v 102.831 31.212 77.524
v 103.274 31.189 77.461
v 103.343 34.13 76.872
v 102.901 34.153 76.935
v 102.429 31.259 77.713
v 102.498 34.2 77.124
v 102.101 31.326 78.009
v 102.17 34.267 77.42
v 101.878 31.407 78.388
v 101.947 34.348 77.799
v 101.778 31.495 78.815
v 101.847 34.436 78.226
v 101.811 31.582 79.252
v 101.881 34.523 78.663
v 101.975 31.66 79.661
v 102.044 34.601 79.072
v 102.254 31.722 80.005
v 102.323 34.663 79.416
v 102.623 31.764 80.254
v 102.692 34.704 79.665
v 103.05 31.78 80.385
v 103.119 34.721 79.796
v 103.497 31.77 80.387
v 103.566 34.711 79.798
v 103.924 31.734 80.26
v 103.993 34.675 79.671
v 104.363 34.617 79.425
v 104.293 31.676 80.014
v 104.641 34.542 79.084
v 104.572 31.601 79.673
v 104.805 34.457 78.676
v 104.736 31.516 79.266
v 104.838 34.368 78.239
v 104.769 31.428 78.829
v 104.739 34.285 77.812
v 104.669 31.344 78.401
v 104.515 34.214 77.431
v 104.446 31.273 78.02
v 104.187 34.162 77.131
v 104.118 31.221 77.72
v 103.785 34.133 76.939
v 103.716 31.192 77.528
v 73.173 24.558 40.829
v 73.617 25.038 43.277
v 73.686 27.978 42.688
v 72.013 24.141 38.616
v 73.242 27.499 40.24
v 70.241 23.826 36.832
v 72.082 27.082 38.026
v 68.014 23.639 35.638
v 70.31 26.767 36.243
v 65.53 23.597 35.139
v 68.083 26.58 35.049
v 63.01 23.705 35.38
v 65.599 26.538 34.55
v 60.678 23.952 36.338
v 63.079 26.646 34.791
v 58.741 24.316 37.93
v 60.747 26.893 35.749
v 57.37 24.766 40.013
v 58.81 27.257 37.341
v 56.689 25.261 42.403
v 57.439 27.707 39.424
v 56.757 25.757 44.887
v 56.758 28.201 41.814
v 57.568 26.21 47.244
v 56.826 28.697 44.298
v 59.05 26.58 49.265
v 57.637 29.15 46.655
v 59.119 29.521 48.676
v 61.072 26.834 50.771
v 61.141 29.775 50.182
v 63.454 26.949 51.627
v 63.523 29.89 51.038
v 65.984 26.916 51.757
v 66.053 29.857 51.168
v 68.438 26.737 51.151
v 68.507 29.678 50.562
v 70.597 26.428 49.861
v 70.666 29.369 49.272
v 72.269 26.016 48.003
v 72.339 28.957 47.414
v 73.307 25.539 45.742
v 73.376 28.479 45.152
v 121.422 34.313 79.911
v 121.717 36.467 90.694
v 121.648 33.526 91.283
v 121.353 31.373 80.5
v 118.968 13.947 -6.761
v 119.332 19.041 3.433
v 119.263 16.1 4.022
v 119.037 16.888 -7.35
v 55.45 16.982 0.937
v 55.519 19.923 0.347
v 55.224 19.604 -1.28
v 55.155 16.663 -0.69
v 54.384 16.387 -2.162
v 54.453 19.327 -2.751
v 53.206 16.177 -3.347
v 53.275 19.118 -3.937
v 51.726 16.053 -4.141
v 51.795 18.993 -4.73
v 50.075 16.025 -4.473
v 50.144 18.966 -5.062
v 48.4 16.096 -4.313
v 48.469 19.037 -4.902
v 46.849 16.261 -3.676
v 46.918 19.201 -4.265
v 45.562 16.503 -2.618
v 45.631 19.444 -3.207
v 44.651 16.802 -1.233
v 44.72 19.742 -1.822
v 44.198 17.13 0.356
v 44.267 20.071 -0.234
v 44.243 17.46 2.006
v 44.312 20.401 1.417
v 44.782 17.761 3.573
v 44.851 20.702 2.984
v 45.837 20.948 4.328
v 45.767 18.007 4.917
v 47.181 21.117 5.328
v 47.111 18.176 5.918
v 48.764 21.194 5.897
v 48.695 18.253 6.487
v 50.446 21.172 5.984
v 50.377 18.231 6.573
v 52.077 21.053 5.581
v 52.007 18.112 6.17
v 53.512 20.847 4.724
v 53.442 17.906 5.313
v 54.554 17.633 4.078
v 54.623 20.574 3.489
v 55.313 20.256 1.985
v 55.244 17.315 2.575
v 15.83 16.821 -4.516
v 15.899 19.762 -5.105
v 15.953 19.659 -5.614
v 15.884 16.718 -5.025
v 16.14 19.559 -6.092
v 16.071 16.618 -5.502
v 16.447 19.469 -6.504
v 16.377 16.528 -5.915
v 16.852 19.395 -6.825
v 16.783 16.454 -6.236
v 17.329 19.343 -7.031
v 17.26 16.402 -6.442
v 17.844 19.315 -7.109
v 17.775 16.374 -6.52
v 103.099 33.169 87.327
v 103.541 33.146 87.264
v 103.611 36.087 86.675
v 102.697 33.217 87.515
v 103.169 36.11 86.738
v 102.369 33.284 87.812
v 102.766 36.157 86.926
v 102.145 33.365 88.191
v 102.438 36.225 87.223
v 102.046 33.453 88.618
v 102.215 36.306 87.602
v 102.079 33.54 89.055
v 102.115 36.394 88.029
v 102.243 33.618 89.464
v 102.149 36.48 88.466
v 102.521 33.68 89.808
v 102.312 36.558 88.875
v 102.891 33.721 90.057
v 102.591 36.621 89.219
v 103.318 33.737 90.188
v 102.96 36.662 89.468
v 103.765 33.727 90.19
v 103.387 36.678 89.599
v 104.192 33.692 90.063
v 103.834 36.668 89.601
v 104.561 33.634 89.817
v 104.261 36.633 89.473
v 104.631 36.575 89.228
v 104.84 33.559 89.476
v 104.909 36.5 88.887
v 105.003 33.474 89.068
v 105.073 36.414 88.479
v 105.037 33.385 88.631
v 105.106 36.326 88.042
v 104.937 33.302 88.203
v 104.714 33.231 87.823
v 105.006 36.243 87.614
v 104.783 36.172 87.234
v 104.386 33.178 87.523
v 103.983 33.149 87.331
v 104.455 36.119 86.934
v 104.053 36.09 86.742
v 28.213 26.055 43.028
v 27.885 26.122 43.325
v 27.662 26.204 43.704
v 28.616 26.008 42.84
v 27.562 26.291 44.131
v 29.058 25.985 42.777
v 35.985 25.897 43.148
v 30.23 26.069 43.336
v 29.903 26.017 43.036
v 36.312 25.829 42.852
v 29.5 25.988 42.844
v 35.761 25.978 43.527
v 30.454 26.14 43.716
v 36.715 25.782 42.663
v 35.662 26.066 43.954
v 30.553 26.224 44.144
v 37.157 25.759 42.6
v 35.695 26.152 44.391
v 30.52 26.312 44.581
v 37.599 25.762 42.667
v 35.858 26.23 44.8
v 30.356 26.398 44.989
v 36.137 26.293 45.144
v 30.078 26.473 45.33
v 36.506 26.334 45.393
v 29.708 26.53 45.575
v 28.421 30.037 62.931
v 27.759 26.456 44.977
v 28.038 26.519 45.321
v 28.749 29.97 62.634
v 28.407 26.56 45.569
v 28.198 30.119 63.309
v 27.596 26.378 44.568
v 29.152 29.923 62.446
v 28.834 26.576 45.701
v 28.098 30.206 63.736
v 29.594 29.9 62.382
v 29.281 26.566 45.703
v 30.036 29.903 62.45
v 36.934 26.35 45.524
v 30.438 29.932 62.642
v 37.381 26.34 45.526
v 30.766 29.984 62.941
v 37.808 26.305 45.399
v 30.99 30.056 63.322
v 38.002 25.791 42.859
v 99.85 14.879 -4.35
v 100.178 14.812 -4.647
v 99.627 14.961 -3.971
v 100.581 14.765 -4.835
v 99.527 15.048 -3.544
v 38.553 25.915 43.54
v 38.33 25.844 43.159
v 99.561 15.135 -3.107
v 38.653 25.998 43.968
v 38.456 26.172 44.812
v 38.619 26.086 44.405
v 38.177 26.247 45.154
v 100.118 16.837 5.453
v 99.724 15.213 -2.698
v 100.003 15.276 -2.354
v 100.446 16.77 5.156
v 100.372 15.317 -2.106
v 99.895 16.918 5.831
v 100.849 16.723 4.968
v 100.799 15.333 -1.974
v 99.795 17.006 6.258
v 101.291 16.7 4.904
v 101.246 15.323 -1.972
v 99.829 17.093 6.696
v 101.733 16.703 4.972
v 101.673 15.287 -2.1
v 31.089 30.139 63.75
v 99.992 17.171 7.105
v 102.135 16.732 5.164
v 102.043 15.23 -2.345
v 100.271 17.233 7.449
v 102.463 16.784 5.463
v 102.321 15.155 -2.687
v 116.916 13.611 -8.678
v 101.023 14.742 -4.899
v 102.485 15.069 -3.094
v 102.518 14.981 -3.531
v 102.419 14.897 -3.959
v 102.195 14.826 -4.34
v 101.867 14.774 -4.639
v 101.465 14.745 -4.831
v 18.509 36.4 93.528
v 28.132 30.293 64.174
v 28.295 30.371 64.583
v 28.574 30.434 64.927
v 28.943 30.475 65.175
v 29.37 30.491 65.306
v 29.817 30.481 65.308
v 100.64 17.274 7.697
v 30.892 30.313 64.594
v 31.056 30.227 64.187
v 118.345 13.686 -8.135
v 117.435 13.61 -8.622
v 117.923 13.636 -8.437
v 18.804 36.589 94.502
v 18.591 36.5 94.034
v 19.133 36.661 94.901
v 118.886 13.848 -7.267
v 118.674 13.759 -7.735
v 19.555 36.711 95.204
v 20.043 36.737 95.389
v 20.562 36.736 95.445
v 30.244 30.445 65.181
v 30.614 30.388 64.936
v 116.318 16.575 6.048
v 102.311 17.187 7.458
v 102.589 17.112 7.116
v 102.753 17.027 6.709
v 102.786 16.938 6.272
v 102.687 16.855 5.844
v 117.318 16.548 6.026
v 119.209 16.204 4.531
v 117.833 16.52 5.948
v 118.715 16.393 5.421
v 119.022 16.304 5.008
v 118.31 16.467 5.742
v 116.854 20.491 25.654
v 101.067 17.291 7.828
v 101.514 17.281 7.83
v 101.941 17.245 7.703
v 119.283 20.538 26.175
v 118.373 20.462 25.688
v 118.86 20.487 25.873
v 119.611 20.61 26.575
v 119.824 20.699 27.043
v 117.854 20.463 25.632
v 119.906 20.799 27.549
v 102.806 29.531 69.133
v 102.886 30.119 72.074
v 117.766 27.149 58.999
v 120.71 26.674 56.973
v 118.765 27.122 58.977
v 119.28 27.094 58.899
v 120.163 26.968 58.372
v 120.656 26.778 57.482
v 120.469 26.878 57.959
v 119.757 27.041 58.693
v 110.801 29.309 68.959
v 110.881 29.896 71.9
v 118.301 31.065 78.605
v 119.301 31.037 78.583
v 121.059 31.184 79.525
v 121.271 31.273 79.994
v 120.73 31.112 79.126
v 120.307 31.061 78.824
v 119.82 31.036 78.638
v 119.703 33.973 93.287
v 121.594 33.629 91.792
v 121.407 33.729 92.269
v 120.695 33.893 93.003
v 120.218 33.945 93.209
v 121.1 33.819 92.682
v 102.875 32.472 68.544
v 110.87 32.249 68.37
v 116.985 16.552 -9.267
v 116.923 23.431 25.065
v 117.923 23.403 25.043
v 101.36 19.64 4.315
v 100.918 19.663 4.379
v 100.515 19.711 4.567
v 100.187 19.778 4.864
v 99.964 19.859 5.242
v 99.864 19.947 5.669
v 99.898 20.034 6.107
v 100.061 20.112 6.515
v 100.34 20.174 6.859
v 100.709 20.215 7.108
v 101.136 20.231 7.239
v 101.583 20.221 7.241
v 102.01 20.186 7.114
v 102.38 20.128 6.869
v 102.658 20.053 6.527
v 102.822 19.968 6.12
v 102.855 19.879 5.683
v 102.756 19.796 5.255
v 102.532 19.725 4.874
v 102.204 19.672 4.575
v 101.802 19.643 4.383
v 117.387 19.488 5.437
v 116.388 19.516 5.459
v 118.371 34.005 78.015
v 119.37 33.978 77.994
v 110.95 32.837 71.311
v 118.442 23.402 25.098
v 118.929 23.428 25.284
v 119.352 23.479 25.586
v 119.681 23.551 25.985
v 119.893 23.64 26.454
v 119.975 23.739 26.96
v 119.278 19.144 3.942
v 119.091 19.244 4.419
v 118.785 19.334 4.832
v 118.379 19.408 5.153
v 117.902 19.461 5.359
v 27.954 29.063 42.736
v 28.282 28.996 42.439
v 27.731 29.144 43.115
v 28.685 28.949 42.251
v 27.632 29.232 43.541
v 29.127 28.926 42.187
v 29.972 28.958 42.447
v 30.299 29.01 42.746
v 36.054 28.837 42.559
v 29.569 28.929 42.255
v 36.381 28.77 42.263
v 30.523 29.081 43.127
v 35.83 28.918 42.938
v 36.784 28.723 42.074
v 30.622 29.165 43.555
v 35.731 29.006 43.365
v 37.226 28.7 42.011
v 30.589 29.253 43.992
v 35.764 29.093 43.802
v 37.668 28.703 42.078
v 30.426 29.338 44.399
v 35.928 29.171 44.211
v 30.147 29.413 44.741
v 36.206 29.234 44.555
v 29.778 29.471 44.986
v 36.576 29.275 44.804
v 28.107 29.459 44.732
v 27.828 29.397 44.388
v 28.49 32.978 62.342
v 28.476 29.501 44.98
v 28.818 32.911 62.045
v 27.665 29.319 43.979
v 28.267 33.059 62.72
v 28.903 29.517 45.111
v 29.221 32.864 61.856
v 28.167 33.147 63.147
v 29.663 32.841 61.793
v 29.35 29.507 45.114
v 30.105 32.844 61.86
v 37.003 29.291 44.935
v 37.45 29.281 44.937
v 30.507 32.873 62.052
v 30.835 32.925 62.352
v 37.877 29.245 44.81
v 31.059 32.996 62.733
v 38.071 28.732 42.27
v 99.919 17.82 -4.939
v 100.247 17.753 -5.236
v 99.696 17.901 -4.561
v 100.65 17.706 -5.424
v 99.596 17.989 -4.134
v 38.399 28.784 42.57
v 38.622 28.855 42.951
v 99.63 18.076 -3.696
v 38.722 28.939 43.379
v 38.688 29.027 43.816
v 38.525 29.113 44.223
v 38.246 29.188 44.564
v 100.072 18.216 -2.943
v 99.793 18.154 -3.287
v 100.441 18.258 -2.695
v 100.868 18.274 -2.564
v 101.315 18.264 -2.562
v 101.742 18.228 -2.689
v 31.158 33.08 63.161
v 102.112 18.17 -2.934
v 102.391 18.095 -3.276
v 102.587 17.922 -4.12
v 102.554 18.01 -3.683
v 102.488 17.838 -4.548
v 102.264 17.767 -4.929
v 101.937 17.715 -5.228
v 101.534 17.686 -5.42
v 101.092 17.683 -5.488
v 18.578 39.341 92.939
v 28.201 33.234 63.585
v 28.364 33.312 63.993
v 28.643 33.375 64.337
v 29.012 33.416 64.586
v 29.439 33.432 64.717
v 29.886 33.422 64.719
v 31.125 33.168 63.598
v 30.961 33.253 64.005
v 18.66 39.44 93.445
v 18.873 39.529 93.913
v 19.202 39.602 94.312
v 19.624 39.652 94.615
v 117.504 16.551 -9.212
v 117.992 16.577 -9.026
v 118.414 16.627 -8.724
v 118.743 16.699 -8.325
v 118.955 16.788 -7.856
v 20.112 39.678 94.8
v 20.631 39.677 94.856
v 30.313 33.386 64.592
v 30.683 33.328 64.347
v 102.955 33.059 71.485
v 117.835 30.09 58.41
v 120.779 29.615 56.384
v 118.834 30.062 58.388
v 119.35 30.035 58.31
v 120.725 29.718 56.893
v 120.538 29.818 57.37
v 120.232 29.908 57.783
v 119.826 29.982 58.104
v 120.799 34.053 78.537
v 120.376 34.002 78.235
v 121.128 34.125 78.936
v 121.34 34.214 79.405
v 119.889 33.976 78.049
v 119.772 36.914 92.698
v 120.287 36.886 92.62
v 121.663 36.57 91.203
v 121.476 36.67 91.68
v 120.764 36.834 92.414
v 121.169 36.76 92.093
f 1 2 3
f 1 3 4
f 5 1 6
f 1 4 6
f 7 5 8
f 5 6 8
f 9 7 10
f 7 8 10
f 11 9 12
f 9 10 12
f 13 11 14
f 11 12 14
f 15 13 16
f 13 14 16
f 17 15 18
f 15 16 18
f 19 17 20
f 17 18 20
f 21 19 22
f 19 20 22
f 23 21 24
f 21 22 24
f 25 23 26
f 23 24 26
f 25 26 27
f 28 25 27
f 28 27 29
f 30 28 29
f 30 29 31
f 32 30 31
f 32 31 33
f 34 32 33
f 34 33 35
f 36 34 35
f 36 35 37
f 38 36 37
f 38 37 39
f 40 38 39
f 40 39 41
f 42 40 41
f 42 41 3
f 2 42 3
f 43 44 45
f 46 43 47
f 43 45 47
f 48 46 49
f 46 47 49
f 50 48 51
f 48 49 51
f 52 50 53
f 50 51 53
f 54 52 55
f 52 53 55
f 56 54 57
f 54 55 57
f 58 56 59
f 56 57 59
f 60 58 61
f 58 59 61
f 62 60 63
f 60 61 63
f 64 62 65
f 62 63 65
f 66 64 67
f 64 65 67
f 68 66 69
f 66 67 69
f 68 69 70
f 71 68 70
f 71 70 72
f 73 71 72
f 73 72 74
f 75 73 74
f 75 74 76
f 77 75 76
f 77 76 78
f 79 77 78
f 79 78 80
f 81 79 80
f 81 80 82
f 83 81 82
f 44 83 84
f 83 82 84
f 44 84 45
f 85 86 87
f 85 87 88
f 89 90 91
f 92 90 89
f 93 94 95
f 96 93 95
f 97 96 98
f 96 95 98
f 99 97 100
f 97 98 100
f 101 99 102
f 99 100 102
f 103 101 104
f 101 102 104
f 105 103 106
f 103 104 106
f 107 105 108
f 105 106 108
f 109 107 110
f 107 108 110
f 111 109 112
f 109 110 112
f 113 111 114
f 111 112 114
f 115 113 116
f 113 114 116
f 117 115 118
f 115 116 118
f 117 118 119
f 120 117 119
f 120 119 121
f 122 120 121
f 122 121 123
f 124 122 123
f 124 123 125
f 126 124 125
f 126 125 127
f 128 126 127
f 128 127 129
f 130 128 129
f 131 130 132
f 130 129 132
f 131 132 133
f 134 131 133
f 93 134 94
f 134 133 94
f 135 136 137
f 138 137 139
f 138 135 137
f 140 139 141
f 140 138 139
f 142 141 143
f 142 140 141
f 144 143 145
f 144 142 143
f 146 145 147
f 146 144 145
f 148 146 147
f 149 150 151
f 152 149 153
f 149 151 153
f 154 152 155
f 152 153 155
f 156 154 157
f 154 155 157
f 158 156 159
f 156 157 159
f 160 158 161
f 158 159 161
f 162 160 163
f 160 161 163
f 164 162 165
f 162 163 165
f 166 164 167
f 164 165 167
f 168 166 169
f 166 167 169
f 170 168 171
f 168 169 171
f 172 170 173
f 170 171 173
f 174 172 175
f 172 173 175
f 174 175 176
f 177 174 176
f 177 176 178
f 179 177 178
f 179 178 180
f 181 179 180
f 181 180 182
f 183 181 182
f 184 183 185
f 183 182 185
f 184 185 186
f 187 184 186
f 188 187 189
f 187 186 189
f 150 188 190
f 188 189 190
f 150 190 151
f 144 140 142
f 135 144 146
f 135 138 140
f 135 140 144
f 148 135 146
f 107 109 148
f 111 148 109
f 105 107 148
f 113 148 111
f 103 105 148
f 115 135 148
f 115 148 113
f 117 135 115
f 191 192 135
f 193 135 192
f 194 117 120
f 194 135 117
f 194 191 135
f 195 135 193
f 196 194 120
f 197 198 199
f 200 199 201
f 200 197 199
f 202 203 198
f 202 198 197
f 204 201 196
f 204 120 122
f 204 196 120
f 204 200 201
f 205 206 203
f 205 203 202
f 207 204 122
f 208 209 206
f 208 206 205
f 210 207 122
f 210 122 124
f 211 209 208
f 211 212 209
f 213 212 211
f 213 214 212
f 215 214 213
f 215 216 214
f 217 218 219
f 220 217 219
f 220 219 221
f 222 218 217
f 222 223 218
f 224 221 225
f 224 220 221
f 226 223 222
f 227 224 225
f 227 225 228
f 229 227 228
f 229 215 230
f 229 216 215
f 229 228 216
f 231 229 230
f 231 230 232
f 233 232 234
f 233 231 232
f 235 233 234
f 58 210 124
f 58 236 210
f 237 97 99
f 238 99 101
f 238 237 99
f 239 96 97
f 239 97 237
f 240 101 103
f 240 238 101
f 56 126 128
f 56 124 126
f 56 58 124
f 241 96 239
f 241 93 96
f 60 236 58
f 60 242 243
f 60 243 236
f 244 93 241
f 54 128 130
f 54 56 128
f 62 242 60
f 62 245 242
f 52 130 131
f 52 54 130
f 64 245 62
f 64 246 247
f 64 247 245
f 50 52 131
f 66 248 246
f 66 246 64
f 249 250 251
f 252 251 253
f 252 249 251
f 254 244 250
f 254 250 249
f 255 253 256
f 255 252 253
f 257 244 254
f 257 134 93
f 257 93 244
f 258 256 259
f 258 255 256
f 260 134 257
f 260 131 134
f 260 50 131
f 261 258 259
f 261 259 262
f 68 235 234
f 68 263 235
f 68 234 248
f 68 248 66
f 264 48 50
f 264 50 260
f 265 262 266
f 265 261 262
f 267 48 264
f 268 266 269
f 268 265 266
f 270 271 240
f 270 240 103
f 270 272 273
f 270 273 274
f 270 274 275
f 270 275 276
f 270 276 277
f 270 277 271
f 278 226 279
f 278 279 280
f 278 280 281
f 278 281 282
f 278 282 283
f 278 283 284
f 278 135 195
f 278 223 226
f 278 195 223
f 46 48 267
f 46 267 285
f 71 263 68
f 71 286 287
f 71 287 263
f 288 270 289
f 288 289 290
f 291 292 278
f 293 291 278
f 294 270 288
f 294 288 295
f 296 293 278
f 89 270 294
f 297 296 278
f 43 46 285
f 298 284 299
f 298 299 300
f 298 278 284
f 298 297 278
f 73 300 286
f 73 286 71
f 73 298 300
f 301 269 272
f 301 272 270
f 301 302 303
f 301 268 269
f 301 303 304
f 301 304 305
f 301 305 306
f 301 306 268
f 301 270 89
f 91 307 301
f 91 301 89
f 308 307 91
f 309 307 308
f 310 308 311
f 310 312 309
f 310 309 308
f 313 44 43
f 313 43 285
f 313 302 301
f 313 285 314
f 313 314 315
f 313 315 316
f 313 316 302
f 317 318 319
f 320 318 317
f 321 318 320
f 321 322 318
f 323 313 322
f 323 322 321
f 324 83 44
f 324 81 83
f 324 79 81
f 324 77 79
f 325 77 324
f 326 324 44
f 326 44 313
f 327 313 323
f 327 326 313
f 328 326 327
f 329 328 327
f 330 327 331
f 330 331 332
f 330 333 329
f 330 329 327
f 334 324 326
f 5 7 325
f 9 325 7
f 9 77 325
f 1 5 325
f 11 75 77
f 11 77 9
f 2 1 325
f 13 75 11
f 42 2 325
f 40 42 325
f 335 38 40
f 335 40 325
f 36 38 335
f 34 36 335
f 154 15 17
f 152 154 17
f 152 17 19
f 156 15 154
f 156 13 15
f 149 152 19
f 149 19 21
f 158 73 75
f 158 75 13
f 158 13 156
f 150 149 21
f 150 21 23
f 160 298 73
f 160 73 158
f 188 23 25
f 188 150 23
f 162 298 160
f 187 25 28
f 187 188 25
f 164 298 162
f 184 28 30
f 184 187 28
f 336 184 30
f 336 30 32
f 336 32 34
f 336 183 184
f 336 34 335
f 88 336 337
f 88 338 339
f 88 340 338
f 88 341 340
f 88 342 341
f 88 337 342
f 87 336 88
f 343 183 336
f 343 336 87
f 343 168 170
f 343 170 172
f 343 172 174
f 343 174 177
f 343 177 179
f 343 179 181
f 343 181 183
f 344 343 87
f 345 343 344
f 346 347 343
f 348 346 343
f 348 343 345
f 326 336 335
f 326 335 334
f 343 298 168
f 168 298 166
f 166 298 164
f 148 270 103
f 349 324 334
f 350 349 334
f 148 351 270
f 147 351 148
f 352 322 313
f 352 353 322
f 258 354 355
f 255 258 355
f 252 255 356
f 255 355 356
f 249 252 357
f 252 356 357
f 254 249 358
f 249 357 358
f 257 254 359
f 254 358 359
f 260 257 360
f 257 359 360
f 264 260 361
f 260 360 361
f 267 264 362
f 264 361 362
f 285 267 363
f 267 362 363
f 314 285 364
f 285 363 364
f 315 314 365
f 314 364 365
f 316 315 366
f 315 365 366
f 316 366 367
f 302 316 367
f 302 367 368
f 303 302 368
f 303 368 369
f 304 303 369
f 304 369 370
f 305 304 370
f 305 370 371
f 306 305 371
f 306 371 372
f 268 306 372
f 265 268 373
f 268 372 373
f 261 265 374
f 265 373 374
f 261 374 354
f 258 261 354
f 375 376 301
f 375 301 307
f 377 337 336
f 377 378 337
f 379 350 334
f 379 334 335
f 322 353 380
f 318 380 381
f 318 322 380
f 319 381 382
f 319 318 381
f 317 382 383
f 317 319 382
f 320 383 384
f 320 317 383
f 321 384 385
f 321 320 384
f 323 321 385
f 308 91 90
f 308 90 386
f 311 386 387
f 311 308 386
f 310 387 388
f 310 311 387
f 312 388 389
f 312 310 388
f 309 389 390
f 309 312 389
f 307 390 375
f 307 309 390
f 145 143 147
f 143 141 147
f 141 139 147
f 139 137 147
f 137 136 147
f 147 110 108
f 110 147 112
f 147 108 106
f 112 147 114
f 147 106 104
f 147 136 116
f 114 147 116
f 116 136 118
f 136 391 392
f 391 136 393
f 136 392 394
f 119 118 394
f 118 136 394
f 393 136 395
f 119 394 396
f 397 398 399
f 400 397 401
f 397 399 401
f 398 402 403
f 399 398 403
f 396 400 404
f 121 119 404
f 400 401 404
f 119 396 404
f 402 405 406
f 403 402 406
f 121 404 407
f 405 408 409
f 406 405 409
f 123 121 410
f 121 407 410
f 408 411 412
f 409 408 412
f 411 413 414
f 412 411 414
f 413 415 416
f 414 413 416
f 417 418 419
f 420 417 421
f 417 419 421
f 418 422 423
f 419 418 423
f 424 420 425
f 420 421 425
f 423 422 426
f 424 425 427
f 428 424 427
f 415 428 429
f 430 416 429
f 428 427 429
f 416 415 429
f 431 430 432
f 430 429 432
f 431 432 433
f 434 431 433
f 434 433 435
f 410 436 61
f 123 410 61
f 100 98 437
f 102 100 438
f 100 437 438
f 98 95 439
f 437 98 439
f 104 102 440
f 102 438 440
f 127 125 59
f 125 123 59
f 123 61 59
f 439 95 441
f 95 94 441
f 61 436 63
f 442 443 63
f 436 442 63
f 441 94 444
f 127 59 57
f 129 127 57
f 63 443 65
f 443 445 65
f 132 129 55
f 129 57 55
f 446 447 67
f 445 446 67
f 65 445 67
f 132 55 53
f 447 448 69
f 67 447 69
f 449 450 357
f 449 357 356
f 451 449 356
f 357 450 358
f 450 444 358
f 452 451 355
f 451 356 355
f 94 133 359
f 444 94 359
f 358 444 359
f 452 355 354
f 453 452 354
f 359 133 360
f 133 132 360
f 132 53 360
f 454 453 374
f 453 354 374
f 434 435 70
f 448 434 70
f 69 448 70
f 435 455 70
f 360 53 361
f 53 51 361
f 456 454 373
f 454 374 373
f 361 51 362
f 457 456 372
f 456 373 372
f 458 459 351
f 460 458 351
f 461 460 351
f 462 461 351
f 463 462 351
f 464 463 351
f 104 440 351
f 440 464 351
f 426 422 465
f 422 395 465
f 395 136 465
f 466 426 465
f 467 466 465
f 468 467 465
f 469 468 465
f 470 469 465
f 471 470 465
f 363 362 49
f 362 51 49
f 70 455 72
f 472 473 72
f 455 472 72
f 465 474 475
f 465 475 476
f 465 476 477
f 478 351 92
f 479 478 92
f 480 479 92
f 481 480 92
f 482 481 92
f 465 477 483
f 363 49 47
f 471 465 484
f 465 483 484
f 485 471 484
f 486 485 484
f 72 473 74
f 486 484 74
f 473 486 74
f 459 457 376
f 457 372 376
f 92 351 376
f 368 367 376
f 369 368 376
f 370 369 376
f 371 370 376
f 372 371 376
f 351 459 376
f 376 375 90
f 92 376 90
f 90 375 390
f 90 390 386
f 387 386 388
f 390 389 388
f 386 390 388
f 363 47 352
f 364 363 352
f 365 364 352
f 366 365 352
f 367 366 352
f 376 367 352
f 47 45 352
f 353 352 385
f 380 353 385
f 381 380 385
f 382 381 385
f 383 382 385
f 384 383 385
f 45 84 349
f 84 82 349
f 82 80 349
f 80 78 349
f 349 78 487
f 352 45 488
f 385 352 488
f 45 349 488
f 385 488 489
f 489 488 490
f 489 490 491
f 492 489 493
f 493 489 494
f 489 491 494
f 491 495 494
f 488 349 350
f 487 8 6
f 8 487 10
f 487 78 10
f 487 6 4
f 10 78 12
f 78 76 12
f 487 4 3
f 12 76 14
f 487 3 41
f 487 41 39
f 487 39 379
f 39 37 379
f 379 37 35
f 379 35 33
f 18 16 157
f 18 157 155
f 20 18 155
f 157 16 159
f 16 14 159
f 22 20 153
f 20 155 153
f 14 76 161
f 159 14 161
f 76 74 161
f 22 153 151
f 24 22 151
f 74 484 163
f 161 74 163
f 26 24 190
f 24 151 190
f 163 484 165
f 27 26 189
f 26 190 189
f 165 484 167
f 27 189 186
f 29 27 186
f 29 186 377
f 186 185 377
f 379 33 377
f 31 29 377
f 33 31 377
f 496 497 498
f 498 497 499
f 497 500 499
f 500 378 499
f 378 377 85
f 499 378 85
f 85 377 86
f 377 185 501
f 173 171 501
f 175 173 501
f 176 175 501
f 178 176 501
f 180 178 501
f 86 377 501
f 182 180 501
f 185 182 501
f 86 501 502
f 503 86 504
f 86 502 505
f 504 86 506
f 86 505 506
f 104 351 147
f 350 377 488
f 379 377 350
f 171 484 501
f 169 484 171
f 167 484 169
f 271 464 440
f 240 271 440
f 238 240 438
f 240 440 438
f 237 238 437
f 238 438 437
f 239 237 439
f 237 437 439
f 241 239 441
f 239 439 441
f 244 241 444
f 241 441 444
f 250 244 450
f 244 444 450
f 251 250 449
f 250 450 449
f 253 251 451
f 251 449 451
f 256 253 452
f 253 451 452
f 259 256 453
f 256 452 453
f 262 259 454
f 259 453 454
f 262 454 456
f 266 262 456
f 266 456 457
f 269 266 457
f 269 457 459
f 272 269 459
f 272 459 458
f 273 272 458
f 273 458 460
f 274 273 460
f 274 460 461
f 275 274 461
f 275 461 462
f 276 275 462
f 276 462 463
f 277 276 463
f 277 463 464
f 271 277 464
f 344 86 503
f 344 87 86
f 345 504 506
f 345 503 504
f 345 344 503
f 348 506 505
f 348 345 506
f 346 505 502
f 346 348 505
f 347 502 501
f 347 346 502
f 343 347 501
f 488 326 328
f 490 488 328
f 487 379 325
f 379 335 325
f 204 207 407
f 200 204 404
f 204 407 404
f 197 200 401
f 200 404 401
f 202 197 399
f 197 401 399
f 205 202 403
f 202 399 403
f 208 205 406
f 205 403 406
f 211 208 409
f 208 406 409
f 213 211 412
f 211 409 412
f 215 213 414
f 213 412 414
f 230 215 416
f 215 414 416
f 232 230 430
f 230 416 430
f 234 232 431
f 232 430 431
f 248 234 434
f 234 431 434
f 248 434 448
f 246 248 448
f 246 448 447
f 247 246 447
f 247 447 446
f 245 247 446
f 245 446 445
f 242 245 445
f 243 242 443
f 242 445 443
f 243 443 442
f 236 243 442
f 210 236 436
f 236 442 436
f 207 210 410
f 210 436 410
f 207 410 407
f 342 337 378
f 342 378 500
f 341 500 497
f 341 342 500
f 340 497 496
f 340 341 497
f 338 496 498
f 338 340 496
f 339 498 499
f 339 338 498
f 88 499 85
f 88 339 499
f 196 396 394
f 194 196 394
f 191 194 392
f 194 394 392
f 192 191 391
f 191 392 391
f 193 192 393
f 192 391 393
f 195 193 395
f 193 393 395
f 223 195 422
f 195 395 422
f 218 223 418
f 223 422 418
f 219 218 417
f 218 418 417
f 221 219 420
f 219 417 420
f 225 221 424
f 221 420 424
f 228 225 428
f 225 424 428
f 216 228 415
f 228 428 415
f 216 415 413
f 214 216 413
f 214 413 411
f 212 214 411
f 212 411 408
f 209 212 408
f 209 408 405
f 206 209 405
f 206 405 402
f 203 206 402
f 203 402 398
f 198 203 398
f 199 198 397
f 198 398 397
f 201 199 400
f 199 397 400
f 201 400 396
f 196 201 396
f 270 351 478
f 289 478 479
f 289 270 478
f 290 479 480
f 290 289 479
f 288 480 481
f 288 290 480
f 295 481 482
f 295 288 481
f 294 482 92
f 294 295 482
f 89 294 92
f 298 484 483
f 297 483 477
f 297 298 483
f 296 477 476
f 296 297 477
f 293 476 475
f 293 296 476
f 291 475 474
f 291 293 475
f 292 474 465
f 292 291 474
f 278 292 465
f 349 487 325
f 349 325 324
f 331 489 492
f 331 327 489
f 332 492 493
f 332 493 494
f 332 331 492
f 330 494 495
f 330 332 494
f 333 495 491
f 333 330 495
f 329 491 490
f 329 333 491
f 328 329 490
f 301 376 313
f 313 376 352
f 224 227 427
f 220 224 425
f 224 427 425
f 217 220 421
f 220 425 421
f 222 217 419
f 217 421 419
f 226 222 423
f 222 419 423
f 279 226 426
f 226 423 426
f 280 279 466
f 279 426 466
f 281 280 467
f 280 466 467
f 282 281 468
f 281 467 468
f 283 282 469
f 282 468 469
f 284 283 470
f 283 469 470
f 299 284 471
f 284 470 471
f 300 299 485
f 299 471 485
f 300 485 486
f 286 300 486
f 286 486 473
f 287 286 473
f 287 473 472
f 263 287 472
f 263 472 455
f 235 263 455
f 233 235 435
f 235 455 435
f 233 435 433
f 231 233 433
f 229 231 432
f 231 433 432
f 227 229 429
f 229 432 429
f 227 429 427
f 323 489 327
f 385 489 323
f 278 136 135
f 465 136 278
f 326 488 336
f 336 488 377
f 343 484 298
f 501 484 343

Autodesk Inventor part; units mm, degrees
ref_plane "YZ Plane" through (0, 0, 0) normal (1, 0, 0) x (0, 1, 0)
ref_plane "XZ Plane" through (0, 0, 0) normal (0, 1, 0) x (-1, 0, 0)
ref_plane "Plano de trabajo1" through (39.4603, 28.9326, 43.4345) normal (-0.0230448, -0.9802565, 0.1963824) x (0.9993754, -0.0278517, -0.0217506)
sketch "Boceto1" plane through (39.4603, 28.9326, 43.4345) normal (-0.0230448, -0.9802565, 0.1963824) x (0.9993754, -0.0278517, -0.0217506)
  circle A0 centre (25.7474, -0.0015) radius 6 construction
  circle A1 centre (25.7474, -0.0015) radius 8.5 construction
  circle A2 centre (25.7474, -0.0015) radius 8.5
  line L0 (73.7302, -52.0094) -> (-22.2354, -52.0094)
  line L1 (-22.2354, -52.0094) -> (-22.2354, 52.0063)
  line L2 (-22.2354, 52.0063) -> (73.7302, 52.0063)
  line L3 (73.7302, 52.0063) -> (73.7302, -52.0094)
  line L4 (73.7302, -52.0094) -> (-22.2354, 52.0063) construction
  line L5 (-22.2354, -52.0094) -> (73.7302, 52.0063) construction
  line L6 (18.0272, 52.0081) -> (-18.0728, 52.0046) construction
  line L7 (73.7311, 10.0133) -> (73.7292, 30.0133) construction
  circle A3 centre (11.587, -43.5711) radius 5.65 construction
  circle A4 centre (11.587, -43.5711) radius 5.65
  line L8 (77.9675, -50.0094) -> (77.9675, 50.0063) projected
  line L9 (73.7302, 52.0063) -> (77.9675, 52.0063)
  line L10 (77.9675, 52.0063) -> (77.9675, -52.0094)
  line L11 (77.9675, -52.0094) -> (73.7302, -52.0094)
  line L12 (73.7302, -52.0094) -> (73.7302, 52.0063)
  line L13 (77.9675, 17.0063) -> (74.9675, 17.0063) projected
  line L14 (77.9675, 37.0063) -> (74.9675, 37.0063) projected
  line L15 (77.9675, -37.0094) -> (74.9675, -37.0094) projected
  line L16 (77.9675, -17.0094) -> (74.9675, -17.0094) projected
  line L17 (77.9675, -37.0094) -> (73.7302, -37.0094)
  line L18 (73.7302, -37.0094) -> (73.7302, -17.0094)
  line L19 (73.7302, -17.0094) -> (77.9675, -17.0094)
  line L20 (77.9675, -17.0094) -> (77.9675, -37.0094)
  line L21 (77.9675, 17.0063) -> (73.7302, 17.0063)
  line L22 (73.7302, 17.0063) -> (73.7302, 37.0063)
  line L23 (73.7302, 37.0063) -> (77.9675, 37.0063)
  line L24 (77.9675, 37.0063) -> (77.9675, 17.0063)
  line L25 (77.9675, 52.0063) -> (80.9675, 52.0063)
  line L26 (80.9675, 52.0063) -> (80.9675, 37.0063)
  line L27 (80.9675, 37.0063) -> (77.9675, 37.0063)
  line L28 (77.9675, 37.0063) -> (77.9675, 52.0063)
  line L29 (77.9675, 17.0063) -> (80.9675, 17.0063)
  line L30 (80.9675, 17.0063) -> (80.9675, -17.0094)
  line L31 (80.9675, -17.0094) -> (77.9675, -17.0094)
  line L32 (77.9675, -17.0094) -> (77.9675, 17.0063)
  line L33 (77.9675, -37.0094) -> (80.9675, -37.0094)
  line L34 (80.9675, -37.0094) -> (80.9675, -52.0094)
  line L35 (80.9675, -52.0094) -> (77.9675, -52.0094)
  line L36 (77.9675, -52.0094) -> (77.9675, -37.0094)
  point P0 (-37.6851, -49.2992)
  point P1 (73.7302, 20.0133)
  point P2 (-0.0228, 52.0063)
  point P3 (77.9675, -0.0015)
  point P4 (76.4675, -17.0094)
  point P5 (77.9675, -50.0094)
  point P6 (74.9675, -37.0094)
  point P7 (74.9675, 17.0063)
  point P8 (73.7302, 17.0063)
  point P9 (73.7302, -17.0094)
  point P10 (74.9675, -17.0094)
  point P11 (73.7302, 37.0063)
  point P12 (74.9675, 37.0063)
  point P13 (77.9675, 50.0063)
  point P14 (77.9675, -52.0094)
  point P15 (77.9675, -17.0094)
  point P16 (77.9675, 37.0063)
  dimension "d33" = 3
extrude "Extrusión1" add sketch "Boceto1" along normal blind 3
sketch "Boceto3" plane through (39.3912, 25.9918, 44.0236) normal (-0.0230448, -0.9802565, 0.1963824) x (0.9993754, -0.0278517, -0.0217506)
  line L0 (44.9302, -50.0094) -> (44.9302, 50.0063) construction
  line L1 (47.9302, -50.0094) -> (47.9302, 50.0063) construction
  line L2 (44.9302, 37.0063) -> (47.9302, 37.0063)
  line L3 (47.9302, 37.0063) -> (47.9302, 17.0063)
  line L4 (47.9302, 17.0063) -> (44.9302, 17.0063)
  line L5 (44.9302, 17.0063) -> (44.9302, 37.0063)
  line L6 (73.7302, 52.0063) -> (-22.2354, 52.0063) construction
  line L7 (44.9302, -17.0094) -> (47.9302, -17.0094)
  line L8 (47.9302, -17.0094) -> (47.9302, -37.0094)
  line L9 (47.9302, -37.0094) -> (44.9302, -37.0094)
  line L10 (44.9302, -37.0094) -> (44.9302, -17.0094)
  line L11 (-22.2354, -52.0094) -> (73.7302, -52.0094) construction
  point P0 (-37.6851, -49.2992)
  point P1 (-22.2354, 52.0063)
  point P2 (-22.2354, -52.0094)
  point P3 (73.7302, -52.0094)
  point P4 (46.4302, -37.0094)
  dimension "d2" = 20
  dimension "d3" = 15
  dimension "d4" = 15
  dimension "d5" = 20
extrude "Extrusión2" [suppressed]
sketch "Boceto4" plane through (39.3912, 25.9918, 44.0236) normal (-0.0230448, -0.9802565, 0.1963824) x (0.9993754, -0.0278517, -0.0217506)
  circle A0 centre (62.9302, -47.0094) radius 1.6 construction
  circle A1 centre (62.9302, -37.0094) radius 1.6 construction
  circle A2 centre (62.9302, 37.0063) radius 1.6 construction
  circle A3 centre (62.9302, 47.0063) radius 1.6 construction
  point P0 (-37.6851, -49.2992)
hole "Agujero1" at (101.0227, 15.0366, -3.4278) at (101.2906, 16.9942, 6.3751) at (103.2735, 31.4834, 78.9317) at (103.5414, 33.441, 88.7345) direction (0.0230448, 0.9802565, -0.1963824) diameter 3 end through all
sketch "Boceto5" plane through (39.3912, 25.9918, 44.0236) normal (-0.0230448, -0.9802565, 0.1963824) x (0.9993754, -0.0278517, -0.0217506)
  line L0 (-22.2354, 52.0063) -> (-22.2354, -52.0094) construction
  line L1 (-22.2354, -52.0094) -> (73.7302, -52.0094) construction
  circle A0 centre (-10.3398, 19.9988) radius 1.6 construction
  circle A1 centre (-10.3398, -0.0012) radius 1.6 construction
  point P0 (-37.6851, -49.2992)
  point P1 (-2.2354, -0.0015)
  point P2 (-22.2354, -0.0015)
  dimension "d16" = 20
  dimension "d18" = 0
hole "Agujero2" at (37.1571, 26.0538, 44.0708) at (29.5936, 30.1947, 63.853) at (29.0578, 26.2796, 44.2473) direction (0.0230448, 0.9802565, -0.1963824) diameter 3 end through all
sketch "Boceto6" plane through (39.3912, 25.9918, 44.0236) normal (-0.0230448, -0.9802565, 0.1963824) x (0.9993754, -0.0278517, -0.0217506)
  line L0 (70.7302, 30.0063) -> (62.7302, 30.0063)
  line L1 (62.7302, 30.0063) -> (62.7302, 27.0063)
  line L2 (62.7302, 27.0063) -> (70.7302, 27.0063)
  line L3 (70.7302, 27.0063) -> (70.7302, 30.0063)
  line L4 (70.7302, 30.0063) -> (62.7302, 27.0063) construction
  line L5 (62.7302, 30.0063) -> (70.7302, 27.0063) construction
  line L6 (73.7302, 17.0063) -> (73.7302, 37.0063) construction
  line L7 (73.7302, 52.0063) -> (-22.2354, 52.0063) construction
  point P0 (-37.6851, -49.2992)
  point P1 (66.7302, 28.5063)
  point P2 (73.7302, -52.0094)
  point P3 (70.7302, 28.5063)
  dimension "d26" = 8
  dimension "d27" = 3
  dimension "d28" = 3
  dimension "d29" = 22
extrude "Extrusión3" cut sketch "Boceto6" against normal through all
fillet "Empalme1" radius 2 8 edges at (18.5975, 38.2622, 95.1938) (15.8108, 17.9002, -6.7714) (121.736, 35.3878, 92.9491) (121.3341, 32.4514, 78.2448) (120.7983, 28.5363, 58.6391) (119.887, 21.8774, 25.2939) (119.3512, 17.9622, 5.6882) (118.9493, 15.0258, -9.0161)
properties part number "BaseMotoJose"
